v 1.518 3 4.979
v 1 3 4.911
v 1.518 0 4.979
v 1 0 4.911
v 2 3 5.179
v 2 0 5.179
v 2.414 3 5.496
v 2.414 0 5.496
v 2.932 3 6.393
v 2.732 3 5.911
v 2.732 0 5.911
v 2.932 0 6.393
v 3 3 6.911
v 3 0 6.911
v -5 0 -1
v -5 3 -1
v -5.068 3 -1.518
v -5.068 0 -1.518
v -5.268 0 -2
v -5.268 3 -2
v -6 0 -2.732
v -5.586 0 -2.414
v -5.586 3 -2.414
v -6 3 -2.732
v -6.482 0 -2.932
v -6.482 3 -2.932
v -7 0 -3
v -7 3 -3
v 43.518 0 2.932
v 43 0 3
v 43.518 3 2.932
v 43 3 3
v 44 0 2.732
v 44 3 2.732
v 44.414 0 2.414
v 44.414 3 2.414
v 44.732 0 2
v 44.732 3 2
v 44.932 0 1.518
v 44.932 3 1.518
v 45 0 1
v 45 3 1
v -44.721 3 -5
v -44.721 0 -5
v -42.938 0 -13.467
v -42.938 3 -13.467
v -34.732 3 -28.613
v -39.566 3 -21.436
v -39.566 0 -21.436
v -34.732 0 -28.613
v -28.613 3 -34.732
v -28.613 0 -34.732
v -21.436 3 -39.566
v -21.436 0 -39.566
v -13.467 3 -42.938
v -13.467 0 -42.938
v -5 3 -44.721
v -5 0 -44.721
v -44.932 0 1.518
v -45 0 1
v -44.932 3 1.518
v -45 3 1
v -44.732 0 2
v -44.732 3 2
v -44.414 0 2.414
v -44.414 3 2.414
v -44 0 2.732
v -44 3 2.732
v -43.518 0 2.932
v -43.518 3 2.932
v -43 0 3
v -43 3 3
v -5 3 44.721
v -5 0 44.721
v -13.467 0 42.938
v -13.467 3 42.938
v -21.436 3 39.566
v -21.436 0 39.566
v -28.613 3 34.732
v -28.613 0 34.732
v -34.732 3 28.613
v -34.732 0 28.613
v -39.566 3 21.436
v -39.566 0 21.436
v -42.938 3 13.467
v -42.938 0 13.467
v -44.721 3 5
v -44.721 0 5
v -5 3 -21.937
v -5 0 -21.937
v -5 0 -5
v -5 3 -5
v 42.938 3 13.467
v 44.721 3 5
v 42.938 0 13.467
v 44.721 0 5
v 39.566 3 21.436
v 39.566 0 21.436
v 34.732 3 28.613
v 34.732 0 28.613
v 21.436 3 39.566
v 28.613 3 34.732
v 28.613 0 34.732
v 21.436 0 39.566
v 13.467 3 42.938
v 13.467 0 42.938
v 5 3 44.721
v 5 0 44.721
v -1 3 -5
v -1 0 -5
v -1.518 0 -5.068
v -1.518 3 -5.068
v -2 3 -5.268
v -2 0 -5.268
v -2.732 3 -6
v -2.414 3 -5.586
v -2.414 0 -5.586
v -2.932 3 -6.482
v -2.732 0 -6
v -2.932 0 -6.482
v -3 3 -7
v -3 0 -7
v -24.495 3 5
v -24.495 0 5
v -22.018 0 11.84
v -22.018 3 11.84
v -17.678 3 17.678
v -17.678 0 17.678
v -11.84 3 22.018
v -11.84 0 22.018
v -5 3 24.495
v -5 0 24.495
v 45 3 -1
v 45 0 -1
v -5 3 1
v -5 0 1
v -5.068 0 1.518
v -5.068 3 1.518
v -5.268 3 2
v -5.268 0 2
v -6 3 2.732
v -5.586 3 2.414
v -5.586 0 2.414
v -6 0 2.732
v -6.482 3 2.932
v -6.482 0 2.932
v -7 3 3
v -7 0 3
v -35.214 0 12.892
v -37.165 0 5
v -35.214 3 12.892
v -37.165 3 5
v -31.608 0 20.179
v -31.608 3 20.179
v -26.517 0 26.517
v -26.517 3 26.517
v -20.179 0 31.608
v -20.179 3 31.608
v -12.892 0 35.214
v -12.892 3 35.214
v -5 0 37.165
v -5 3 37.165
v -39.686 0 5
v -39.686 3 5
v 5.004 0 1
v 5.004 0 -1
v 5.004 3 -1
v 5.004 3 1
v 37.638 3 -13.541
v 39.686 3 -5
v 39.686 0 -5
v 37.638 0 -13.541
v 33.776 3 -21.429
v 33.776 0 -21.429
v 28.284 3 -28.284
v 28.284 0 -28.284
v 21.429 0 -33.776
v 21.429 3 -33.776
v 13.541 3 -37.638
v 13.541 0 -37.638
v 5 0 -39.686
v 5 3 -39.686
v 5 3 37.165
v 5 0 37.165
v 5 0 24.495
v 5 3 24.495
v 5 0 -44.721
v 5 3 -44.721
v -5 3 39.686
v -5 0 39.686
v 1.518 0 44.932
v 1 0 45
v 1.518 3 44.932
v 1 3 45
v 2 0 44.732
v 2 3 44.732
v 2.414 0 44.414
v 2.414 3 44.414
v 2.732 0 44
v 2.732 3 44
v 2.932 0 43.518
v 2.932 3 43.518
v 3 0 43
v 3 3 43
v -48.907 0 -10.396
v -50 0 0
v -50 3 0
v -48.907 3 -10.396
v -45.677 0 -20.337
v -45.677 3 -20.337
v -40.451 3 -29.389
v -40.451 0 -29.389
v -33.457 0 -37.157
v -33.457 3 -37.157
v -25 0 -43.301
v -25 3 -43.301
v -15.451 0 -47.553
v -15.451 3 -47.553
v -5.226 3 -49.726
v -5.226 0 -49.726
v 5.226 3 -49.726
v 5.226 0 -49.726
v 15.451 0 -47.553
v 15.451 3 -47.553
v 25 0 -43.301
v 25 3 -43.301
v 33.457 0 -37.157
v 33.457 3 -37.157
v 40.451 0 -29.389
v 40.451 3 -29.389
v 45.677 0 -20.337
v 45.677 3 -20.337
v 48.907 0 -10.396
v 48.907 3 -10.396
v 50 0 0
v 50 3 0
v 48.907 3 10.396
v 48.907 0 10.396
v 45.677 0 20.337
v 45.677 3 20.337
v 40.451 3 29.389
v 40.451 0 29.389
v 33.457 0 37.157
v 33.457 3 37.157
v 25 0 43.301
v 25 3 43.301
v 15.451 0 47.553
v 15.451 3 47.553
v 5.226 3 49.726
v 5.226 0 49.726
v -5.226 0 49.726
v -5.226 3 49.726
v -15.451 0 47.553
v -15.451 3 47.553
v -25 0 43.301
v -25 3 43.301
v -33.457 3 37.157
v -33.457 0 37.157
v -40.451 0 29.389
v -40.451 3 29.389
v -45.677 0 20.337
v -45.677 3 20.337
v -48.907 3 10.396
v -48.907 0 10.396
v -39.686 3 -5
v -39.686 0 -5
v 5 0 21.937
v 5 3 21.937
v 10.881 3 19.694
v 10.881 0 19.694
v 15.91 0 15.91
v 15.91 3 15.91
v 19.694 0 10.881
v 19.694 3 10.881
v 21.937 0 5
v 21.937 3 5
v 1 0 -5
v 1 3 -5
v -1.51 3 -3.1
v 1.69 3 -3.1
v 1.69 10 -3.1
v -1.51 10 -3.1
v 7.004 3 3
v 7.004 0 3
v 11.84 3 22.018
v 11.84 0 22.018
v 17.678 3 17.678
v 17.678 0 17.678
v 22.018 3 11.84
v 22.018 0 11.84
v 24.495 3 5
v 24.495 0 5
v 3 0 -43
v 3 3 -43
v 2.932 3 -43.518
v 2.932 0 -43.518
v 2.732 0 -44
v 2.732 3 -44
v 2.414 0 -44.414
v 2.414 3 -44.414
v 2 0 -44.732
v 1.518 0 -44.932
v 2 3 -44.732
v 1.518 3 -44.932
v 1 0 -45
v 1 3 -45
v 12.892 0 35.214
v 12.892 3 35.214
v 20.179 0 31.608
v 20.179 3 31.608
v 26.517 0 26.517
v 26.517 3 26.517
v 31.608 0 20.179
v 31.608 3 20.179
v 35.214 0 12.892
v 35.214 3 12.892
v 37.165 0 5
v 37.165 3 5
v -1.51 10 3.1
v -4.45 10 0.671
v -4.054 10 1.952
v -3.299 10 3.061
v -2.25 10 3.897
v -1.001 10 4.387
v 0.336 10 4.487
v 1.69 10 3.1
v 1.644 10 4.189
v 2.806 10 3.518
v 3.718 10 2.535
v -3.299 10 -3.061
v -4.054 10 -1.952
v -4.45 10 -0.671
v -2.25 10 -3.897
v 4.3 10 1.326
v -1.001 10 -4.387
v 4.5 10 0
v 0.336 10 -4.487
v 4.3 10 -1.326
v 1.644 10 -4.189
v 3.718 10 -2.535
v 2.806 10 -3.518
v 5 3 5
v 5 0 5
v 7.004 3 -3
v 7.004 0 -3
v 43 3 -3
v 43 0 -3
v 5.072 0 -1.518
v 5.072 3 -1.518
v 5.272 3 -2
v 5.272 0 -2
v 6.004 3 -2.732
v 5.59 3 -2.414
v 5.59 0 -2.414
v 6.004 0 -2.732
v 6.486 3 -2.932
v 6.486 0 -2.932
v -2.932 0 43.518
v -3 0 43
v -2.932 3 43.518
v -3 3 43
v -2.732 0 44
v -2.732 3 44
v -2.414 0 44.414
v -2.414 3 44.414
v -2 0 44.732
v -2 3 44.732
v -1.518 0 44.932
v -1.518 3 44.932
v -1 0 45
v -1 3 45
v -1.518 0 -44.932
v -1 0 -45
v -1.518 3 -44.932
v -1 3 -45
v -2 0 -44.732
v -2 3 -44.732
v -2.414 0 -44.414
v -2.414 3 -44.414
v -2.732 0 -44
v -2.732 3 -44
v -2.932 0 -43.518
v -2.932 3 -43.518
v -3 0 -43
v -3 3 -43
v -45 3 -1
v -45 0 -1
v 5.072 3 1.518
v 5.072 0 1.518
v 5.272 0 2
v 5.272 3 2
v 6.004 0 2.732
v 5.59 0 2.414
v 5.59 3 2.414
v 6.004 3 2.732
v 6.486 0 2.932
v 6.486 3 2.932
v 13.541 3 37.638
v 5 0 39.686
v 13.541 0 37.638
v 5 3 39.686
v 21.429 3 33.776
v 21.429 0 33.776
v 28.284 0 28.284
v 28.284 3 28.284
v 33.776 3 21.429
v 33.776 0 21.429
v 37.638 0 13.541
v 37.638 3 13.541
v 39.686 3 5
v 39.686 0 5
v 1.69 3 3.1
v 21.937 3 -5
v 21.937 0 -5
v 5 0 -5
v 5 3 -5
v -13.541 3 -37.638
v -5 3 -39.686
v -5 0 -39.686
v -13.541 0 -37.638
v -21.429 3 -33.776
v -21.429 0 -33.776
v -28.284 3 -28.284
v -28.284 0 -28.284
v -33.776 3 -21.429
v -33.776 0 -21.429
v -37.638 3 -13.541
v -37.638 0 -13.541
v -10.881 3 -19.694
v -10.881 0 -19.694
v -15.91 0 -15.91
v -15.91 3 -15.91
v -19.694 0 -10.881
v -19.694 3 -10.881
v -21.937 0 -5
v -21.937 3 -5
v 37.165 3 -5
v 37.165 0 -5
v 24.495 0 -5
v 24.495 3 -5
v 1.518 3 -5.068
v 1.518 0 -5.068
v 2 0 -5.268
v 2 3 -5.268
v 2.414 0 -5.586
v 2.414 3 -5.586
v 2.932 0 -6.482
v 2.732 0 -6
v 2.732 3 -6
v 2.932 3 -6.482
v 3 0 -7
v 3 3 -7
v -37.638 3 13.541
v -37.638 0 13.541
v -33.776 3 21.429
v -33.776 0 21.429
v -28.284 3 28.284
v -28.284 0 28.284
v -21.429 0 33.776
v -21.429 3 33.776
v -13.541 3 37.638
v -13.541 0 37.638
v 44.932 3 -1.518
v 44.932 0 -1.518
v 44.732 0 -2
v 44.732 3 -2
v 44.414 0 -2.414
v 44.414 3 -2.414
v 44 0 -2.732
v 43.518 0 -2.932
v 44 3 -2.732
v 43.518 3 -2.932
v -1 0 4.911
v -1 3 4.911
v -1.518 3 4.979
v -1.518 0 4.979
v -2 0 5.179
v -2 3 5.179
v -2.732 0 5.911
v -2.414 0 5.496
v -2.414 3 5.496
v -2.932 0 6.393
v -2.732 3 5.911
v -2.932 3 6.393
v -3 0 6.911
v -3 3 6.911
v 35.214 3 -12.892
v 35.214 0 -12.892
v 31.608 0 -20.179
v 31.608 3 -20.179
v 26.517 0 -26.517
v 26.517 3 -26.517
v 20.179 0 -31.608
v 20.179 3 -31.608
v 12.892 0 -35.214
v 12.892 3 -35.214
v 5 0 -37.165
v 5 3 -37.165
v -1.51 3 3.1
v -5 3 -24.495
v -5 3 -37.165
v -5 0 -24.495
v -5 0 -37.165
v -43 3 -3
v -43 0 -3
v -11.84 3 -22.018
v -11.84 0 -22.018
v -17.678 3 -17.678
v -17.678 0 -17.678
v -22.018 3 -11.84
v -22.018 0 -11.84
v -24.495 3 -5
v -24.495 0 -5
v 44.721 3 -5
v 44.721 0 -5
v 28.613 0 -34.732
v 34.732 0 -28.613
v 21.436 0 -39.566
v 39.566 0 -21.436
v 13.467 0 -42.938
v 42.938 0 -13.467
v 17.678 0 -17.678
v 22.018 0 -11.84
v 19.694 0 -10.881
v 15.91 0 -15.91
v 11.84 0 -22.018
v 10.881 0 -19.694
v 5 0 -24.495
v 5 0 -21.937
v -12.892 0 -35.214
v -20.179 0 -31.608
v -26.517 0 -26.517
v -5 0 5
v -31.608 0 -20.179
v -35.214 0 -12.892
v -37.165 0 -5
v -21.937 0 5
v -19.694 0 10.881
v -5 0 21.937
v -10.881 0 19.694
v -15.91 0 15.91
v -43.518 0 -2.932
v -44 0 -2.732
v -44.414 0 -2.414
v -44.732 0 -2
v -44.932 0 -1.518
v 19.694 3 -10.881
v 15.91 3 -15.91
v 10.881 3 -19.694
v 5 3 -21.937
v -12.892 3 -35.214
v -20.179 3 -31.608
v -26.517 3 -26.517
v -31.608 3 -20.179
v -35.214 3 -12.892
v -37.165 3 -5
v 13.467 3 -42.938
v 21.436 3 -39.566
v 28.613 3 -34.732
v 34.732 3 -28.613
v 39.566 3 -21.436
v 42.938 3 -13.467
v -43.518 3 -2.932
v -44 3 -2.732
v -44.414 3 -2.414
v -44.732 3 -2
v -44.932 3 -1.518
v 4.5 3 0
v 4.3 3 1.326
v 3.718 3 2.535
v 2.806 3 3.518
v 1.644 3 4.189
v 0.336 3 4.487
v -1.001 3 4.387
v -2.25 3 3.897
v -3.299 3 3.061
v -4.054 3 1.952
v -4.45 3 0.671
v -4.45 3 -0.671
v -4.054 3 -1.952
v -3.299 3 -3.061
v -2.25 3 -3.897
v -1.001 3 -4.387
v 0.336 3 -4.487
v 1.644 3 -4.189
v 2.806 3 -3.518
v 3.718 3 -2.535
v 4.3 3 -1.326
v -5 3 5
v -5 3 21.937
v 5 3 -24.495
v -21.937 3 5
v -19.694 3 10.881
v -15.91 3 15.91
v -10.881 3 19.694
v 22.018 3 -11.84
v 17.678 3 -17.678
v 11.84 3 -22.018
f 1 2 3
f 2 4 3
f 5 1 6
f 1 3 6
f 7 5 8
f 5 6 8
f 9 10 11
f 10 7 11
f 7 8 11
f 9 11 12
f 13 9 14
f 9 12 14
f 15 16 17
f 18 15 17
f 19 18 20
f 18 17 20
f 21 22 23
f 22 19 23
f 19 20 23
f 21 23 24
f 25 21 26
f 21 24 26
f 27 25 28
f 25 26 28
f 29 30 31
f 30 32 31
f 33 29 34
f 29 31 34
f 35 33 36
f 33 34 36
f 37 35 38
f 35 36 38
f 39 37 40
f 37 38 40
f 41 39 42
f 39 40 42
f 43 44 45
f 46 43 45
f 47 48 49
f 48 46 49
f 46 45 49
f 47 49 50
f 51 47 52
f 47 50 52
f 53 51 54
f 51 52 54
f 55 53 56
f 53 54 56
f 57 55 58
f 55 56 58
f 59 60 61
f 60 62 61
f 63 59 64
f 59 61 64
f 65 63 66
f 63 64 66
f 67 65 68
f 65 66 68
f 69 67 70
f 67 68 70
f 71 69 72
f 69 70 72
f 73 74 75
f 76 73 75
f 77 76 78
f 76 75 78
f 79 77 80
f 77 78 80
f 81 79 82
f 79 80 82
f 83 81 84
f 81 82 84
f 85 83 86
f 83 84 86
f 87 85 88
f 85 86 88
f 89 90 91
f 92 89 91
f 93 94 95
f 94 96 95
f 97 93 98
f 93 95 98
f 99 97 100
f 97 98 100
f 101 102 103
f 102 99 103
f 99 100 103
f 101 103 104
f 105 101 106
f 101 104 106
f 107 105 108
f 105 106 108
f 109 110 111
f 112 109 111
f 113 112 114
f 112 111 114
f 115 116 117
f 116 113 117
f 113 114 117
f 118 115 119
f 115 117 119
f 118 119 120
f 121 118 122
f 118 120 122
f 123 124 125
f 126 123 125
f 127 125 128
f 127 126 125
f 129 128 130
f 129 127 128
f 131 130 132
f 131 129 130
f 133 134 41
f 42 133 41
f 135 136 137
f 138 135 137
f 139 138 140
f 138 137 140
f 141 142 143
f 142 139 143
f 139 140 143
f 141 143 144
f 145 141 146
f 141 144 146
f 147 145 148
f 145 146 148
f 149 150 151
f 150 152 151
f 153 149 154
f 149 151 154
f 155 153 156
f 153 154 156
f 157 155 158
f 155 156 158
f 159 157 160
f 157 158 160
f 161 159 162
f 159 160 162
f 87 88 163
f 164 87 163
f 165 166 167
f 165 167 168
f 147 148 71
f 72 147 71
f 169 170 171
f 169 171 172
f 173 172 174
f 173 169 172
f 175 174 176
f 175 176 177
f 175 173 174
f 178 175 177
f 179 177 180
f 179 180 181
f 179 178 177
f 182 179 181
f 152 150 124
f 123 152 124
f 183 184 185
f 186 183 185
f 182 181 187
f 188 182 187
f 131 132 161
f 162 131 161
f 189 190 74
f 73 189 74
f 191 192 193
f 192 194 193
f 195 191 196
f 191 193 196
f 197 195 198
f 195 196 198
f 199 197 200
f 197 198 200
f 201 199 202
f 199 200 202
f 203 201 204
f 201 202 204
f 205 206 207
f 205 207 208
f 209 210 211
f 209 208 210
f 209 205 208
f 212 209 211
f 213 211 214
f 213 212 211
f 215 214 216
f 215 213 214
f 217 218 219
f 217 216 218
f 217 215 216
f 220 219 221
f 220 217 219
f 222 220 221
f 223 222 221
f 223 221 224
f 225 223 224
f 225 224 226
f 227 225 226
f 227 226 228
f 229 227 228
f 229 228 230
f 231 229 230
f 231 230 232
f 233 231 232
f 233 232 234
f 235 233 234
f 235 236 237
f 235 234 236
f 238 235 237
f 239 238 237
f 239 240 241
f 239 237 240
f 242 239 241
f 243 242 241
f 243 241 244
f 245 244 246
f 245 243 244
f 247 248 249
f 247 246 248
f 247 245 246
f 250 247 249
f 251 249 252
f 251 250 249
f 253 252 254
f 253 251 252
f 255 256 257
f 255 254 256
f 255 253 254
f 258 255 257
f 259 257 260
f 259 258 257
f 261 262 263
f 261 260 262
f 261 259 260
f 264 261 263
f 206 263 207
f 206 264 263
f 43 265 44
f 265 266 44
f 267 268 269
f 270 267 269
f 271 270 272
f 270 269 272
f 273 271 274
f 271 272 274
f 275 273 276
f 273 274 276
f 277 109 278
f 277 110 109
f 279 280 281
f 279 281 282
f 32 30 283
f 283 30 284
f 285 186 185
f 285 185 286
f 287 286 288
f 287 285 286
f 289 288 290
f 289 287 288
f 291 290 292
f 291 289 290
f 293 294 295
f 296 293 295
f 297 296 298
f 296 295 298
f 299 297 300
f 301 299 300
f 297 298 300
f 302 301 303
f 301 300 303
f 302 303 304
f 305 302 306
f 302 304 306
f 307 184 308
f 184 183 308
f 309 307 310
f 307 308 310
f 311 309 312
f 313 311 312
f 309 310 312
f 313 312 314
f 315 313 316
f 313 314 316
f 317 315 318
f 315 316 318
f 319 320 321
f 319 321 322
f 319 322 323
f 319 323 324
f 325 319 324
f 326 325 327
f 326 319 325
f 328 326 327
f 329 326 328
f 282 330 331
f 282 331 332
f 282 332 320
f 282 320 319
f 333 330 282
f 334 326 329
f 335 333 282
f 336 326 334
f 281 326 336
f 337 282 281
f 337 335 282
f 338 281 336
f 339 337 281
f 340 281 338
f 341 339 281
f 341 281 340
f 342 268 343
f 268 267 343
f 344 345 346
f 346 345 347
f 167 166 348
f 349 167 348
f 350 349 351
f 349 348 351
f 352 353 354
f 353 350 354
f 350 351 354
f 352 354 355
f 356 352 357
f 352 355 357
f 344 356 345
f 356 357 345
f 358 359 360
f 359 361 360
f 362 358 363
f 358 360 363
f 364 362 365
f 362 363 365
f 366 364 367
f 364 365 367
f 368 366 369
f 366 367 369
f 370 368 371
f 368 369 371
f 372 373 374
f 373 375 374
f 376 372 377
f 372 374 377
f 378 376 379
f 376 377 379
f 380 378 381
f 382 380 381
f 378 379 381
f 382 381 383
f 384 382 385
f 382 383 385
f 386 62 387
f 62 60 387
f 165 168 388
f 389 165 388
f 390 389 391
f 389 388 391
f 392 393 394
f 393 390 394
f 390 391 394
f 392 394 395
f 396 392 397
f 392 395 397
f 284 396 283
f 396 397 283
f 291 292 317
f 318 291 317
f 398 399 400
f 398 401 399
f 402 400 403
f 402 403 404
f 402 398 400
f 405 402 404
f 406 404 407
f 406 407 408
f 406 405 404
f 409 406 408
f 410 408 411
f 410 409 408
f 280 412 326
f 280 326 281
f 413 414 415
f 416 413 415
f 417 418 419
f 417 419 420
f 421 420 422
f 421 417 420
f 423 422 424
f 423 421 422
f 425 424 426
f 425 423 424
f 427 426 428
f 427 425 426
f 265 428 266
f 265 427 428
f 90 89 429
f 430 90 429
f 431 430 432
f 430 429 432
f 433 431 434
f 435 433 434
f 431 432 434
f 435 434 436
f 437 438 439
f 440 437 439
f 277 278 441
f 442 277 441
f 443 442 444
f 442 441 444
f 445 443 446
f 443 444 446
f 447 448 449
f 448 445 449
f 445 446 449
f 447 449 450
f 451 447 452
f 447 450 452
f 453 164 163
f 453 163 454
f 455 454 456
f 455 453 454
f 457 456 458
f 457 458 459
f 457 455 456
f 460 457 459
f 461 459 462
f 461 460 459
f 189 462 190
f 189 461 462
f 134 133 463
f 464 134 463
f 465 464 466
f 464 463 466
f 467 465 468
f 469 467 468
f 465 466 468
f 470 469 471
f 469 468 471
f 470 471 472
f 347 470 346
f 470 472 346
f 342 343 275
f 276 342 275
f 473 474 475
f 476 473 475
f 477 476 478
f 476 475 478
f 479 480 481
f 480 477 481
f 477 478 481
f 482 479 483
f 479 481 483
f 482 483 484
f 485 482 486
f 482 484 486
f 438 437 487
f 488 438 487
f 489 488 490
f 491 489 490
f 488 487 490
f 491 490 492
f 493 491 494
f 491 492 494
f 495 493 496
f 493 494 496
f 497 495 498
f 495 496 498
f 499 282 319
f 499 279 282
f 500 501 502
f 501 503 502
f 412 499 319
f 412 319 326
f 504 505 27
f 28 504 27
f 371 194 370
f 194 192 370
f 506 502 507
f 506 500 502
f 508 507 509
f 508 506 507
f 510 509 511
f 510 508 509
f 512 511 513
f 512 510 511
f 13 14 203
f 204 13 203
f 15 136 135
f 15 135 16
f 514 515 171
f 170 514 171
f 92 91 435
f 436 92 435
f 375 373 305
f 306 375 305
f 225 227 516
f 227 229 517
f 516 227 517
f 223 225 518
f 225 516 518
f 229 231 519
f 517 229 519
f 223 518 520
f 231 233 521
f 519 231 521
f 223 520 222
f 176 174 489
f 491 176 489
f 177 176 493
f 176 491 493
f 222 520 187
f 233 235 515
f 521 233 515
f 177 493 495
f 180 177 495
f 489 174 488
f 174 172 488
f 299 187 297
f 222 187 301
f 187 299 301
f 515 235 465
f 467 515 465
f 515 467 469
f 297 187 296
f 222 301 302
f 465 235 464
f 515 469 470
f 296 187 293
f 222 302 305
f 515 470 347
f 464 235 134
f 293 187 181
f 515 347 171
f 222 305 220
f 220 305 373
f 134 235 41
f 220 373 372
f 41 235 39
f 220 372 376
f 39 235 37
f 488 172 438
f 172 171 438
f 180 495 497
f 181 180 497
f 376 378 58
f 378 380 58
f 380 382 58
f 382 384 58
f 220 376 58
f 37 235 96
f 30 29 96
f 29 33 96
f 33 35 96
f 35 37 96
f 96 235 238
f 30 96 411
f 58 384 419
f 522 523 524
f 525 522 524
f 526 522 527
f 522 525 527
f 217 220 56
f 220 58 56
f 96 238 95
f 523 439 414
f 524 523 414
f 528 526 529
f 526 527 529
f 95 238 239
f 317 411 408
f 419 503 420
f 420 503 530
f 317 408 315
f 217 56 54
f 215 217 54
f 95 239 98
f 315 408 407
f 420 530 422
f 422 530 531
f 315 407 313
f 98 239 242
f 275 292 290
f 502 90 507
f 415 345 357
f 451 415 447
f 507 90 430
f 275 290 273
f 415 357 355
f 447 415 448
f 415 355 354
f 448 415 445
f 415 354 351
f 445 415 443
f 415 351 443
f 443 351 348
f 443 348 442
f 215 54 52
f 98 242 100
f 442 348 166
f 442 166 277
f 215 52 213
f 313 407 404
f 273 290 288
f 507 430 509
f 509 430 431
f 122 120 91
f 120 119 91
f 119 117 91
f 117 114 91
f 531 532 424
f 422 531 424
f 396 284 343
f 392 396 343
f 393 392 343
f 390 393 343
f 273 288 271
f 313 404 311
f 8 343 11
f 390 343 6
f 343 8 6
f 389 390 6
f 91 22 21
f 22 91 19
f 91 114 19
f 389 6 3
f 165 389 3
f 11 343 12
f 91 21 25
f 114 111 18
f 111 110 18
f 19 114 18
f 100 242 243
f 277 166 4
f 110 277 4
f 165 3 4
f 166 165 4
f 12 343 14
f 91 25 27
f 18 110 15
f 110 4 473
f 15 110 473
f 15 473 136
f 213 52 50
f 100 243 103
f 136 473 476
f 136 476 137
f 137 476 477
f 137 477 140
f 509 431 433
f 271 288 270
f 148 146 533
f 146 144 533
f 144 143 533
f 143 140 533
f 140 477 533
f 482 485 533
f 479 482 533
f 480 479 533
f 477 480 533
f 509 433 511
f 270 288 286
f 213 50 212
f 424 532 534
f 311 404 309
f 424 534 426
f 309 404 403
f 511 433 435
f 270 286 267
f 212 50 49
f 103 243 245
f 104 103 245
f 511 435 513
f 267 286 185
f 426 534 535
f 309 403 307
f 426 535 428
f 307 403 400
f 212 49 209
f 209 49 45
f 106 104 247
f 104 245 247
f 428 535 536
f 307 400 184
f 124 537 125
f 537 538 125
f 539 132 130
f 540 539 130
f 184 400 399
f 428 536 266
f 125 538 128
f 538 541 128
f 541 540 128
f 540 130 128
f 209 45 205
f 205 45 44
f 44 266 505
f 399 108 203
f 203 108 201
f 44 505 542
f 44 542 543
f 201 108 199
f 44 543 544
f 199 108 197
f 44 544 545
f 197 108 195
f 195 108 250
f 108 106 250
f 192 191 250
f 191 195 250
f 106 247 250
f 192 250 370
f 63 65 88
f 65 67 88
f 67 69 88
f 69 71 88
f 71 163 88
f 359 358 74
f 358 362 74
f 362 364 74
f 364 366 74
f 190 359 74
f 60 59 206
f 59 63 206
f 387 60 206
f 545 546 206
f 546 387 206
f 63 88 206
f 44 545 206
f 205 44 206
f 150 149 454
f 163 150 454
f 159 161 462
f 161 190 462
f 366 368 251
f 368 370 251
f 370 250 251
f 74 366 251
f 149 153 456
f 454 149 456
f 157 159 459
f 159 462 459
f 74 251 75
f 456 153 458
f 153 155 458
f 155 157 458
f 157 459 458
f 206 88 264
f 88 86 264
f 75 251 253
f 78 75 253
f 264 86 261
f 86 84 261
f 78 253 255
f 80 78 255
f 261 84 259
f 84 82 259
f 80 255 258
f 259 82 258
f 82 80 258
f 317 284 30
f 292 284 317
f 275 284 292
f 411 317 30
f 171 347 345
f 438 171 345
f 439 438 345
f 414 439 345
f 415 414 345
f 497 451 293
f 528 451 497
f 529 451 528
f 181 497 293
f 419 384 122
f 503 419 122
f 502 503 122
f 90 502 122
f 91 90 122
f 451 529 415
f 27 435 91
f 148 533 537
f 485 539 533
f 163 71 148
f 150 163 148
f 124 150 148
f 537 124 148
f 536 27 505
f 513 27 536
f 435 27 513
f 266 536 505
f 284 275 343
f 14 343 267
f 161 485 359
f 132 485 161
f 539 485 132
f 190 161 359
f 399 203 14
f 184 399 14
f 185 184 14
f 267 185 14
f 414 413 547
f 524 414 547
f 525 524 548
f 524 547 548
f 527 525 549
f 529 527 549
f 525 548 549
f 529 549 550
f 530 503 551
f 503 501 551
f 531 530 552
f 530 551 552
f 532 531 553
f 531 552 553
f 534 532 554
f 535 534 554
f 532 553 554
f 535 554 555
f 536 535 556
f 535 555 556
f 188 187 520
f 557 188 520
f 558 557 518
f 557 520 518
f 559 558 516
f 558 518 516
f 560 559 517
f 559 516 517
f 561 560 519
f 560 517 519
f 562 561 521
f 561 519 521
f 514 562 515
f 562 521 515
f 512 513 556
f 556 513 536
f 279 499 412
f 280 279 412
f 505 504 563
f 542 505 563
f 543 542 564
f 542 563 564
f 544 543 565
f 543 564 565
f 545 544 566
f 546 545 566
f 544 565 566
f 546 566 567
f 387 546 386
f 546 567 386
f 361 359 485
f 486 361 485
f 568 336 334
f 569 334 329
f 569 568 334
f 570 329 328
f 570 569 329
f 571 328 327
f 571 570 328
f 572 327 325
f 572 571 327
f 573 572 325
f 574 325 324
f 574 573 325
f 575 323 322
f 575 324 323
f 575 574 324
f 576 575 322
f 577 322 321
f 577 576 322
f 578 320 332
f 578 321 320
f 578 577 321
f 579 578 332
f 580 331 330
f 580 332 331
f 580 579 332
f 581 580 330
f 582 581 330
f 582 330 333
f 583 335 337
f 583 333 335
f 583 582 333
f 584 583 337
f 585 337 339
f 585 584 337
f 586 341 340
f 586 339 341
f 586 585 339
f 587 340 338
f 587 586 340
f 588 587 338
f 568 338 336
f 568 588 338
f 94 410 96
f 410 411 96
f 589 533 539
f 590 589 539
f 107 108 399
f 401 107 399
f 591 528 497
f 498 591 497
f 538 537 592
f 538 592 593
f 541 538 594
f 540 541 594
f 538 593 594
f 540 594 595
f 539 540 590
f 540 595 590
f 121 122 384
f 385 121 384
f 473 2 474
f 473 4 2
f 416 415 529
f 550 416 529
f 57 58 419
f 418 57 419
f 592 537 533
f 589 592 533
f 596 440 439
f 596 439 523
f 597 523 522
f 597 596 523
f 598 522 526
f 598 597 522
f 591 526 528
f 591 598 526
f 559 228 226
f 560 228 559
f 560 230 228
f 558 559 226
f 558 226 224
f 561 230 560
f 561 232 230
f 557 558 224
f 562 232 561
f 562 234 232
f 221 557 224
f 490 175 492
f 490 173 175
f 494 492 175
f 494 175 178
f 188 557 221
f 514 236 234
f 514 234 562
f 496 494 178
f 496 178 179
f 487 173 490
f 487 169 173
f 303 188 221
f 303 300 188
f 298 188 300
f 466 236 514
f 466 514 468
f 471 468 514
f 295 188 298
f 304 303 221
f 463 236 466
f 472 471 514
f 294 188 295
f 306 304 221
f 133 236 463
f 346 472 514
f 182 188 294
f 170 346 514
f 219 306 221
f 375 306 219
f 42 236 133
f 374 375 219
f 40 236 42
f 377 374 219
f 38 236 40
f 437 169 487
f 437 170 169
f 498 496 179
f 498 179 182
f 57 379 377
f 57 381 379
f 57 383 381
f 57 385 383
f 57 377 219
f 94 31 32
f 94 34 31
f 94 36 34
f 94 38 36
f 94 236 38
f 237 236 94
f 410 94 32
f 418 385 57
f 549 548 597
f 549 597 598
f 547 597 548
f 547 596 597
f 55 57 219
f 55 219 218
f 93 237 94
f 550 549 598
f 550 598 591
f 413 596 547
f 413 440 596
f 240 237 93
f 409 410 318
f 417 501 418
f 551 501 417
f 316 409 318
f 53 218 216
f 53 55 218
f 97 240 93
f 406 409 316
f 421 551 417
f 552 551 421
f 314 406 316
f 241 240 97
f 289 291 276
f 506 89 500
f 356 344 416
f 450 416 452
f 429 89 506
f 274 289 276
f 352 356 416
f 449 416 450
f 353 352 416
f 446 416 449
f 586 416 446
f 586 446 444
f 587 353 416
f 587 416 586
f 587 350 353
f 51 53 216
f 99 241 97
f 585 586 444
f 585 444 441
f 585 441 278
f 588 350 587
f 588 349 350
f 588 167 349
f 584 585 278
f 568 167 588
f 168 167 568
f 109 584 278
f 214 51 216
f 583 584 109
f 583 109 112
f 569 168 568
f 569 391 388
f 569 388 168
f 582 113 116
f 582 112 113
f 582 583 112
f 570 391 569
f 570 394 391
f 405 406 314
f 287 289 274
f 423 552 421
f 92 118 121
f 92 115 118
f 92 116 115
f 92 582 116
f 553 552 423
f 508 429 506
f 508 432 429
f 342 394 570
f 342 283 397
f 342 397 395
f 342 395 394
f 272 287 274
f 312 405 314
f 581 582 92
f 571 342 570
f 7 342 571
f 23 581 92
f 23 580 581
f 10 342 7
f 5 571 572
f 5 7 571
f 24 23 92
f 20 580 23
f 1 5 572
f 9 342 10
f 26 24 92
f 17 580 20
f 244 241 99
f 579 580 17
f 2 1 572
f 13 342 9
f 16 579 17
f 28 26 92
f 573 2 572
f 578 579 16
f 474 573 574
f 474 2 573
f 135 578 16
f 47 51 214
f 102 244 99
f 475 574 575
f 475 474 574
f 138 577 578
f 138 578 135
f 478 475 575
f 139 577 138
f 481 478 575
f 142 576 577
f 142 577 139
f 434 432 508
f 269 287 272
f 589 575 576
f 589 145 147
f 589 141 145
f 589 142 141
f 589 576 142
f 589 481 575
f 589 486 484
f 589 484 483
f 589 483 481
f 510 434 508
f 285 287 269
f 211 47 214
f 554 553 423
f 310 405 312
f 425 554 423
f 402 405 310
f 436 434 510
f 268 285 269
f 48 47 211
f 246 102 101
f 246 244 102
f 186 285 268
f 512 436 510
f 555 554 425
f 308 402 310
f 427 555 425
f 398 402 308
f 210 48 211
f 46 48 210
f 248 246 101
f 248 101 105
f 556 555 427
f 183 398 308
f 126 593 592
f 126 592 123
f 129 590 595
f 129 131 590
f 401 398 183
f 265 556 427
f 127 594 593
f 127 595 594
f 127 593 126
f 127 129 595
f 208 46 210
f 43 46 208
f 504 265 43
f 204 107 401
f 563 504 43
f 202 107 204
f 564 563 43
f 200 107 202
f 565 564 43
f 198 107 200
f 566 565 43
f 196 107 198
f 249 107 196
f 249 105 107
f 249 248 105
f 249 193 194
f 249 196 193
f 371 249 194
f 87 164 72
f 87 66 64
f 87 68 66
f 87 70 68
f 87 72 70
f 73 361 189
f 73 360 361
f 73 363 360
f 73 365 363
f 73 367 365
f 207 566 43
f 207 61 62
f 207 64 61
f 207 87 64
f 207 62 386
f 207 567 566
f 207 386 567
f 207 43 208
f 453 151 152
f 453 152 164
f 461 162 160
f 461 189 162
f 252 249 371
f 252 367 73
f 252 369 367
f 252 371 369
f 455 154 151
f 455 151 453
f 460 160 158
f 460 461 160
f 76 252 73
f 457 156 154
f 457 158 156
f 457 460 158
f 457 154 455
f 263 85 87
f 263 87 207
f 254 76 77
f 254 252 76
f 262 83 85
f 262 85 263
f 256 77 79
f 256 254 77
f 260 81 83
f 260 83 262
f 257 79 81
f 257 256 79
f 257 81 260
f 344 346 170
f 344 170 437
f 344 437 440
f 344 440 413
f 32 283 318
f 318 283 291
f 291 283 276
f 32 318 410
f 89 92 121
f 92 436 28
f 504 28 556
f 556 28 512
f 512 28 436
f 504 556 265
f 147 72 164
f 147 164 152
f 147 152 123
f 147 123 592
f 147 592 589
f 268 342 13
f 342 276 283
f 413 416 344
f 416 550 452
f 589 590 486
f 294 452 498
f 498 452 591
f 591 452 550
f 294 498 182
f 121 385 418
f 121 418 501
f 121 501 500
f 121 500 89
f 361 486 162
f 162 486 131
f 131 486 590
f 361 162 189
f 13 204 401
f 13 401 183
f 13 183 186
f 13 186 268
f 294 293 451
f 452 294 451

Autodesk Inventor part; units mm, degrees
ref_plane "YZ Plane" through (0, 0, 0) normal (1, 0, 0) x (0, 1, 0)
ref_plane "XZ Plane" through (0, 0, 0) normal (0, 1, 0) x (-1, 0, 0)
ref_plane "XY Plane" through (0, 0, 0) normal (0, 0, 1) x (1, 0, 0)
sketch "Sketch1" plane through (0, 0, 0) normal (0, 1, 0) x (-1, 0, 0)
  circle A0 centre (0, 0) radius 50
  circle A1 centre (0, 0) radius 45
  line L0 (5, 48.7261) -> (-5, 48.7261)
  line L1 (-5, 48.7261) -> (-5, -48.4617)
  line L2 (-5, -48.4617) -> (5, -48.4617)
  line L3 (5, -48.4617) -> (5, 48.7261)
  line L4 (48.4415, 5) -> (-48.0304, 5)
  line L5 (-48.0304, 5) -> (-48.0304, -5)
  line L6 (-48.0304, -5) -> (48.4415, -5)
  line L7 (48.4415, -5) -> (48.4415, 5)
  dimension "d0" = 100
  dimension "d1" = 90
  dimension "d2" = 5
  dimension "d3" = 5
  dimension "d4" = 5
  dimension "d5" = 5
extrude "Extrusion1" add sketch "Sketch1" along normal blind 3 contours A0 | A1 L6 L3 L4 | A1 L4 L7 L6 | L3 L4 L1 A1 | A1 L1 L0 L3 | L3 L6 L1 L4 | L3 L2 L1 A1 | A1 L1 L6 L3 | L1 L6 A1 L4 | A1 L6 L5 L4
sketch "Sketch2" plane through (0, 3, 0) normal (0, 1, 0) x (1, 0, 0)
  circle A0 centre (0, 0) radius 40
  circle A1 centre (0, 0) radius 37.5
  circle A2 centre (0, 0) radius 25
  circle A3 centre (0, 0) radius 22.5
  dimension "d8" = 80
  dimension "d9" = 75
  dimension "d10" = 50
  dimension "d11" = 45
extrude "Extrusion2" add sketch "Sketch2" against normal blind 3
sketch "Sketch3" plane through (0, 3, 0) normal (0, 1, 0) x (1, 0, 0)
  circle A0 centre (0, 0) radius 4.5
  line L0 (-1.51, -3.1) -> (1.69, -3.1)
  line L1 (1.69, -3.1) -> (1.69, 3.1)
  line L2 (1.69, 3.1) -> (-1.51, 3.1)
  line L3 (-1.51, 3.1) -> (-1.51, -3.1)
  dimension "d14" = 9
  dimension "d15" = 6.2
  dimension "d16" = 3.2
  dimension "d17" = 1.51
  dimension "d18" = 3.1
extrude "Extrusion3" add sketch "Sketch3" along normal blind 7
sketch "Sketch4" plane through (0, 3, 0) normal (0, 1, 0) x (1, 0, 0)
  point P0 (0, 0)
sketch "Sketch5" plane through (0, 0, 0) normal (0, -1, 0) x (1, 0, 0)
  line L0 (45, 3) -> (-45, 3)
  line L1 (-45, 3) -> (-45, -3)
  line L2 (-45, -3) -> (45, -3)
  line L3 (45, -3) -> (45, 3)
  line L4 (3, 45) -> (-3, 45)
  line L5 (-3, 45) -> (-3, -45)
  line L6 (-3, -45) -> (3, -45)
  line L7 (3, -45) -> (3, 45)
  point P0 (0, 0)
  dimension "d21" = 90
  dimension "d22" = 90
  dimension "d23" = 45
  dimension "d24" = 45
  dimension "d25" = 3
  dimension "d26" = 3
  dimension "d27" = 3
  dimension "d28" = 3
extrude "Extrusion4" cut sketch "Sketch5" against normal blind 3
sketch "Sketch6" plane through (0, 0, 0) normal (0, -1, 0) x (1, 0, 0)
  line L0 (5.0041, 4.9106) -> (-5, 4.9106)
  line L1 (-5, 4.9106) -> (-5, -5)
  line L2 (-5, -5) -> (5.0041, -5)
  line L3 (5.0041, -5) -> (5.0041, 4.9106)
  point P0 (0, 0)
extrude "Extrusion5" add sketch "Sketch6" against normal blind 3
fillet "Fillet1" radius 2 8 edges at (3, 1.5, 4.9106) (-3, 1.5, 4.9106) (-5, 1.5, 3) (-5, 1.5, -3) (-3, 1.5, -5) (3, 1.5, -5) (5.0041, 1.5, -3) (5.0041, 1.5, 3)
fillet "Fillet2" radius 2 8 edges at (45, 1.5, 3) (45, 1.5, -3) (3, 1.5, 45) (-3, 1.5, 45) (-45, 1.5, 3) (-45, 1.5, -3) (-3, 1.5, -45) (3, 1.5, -45)
properties part number "Scanning Disk"
